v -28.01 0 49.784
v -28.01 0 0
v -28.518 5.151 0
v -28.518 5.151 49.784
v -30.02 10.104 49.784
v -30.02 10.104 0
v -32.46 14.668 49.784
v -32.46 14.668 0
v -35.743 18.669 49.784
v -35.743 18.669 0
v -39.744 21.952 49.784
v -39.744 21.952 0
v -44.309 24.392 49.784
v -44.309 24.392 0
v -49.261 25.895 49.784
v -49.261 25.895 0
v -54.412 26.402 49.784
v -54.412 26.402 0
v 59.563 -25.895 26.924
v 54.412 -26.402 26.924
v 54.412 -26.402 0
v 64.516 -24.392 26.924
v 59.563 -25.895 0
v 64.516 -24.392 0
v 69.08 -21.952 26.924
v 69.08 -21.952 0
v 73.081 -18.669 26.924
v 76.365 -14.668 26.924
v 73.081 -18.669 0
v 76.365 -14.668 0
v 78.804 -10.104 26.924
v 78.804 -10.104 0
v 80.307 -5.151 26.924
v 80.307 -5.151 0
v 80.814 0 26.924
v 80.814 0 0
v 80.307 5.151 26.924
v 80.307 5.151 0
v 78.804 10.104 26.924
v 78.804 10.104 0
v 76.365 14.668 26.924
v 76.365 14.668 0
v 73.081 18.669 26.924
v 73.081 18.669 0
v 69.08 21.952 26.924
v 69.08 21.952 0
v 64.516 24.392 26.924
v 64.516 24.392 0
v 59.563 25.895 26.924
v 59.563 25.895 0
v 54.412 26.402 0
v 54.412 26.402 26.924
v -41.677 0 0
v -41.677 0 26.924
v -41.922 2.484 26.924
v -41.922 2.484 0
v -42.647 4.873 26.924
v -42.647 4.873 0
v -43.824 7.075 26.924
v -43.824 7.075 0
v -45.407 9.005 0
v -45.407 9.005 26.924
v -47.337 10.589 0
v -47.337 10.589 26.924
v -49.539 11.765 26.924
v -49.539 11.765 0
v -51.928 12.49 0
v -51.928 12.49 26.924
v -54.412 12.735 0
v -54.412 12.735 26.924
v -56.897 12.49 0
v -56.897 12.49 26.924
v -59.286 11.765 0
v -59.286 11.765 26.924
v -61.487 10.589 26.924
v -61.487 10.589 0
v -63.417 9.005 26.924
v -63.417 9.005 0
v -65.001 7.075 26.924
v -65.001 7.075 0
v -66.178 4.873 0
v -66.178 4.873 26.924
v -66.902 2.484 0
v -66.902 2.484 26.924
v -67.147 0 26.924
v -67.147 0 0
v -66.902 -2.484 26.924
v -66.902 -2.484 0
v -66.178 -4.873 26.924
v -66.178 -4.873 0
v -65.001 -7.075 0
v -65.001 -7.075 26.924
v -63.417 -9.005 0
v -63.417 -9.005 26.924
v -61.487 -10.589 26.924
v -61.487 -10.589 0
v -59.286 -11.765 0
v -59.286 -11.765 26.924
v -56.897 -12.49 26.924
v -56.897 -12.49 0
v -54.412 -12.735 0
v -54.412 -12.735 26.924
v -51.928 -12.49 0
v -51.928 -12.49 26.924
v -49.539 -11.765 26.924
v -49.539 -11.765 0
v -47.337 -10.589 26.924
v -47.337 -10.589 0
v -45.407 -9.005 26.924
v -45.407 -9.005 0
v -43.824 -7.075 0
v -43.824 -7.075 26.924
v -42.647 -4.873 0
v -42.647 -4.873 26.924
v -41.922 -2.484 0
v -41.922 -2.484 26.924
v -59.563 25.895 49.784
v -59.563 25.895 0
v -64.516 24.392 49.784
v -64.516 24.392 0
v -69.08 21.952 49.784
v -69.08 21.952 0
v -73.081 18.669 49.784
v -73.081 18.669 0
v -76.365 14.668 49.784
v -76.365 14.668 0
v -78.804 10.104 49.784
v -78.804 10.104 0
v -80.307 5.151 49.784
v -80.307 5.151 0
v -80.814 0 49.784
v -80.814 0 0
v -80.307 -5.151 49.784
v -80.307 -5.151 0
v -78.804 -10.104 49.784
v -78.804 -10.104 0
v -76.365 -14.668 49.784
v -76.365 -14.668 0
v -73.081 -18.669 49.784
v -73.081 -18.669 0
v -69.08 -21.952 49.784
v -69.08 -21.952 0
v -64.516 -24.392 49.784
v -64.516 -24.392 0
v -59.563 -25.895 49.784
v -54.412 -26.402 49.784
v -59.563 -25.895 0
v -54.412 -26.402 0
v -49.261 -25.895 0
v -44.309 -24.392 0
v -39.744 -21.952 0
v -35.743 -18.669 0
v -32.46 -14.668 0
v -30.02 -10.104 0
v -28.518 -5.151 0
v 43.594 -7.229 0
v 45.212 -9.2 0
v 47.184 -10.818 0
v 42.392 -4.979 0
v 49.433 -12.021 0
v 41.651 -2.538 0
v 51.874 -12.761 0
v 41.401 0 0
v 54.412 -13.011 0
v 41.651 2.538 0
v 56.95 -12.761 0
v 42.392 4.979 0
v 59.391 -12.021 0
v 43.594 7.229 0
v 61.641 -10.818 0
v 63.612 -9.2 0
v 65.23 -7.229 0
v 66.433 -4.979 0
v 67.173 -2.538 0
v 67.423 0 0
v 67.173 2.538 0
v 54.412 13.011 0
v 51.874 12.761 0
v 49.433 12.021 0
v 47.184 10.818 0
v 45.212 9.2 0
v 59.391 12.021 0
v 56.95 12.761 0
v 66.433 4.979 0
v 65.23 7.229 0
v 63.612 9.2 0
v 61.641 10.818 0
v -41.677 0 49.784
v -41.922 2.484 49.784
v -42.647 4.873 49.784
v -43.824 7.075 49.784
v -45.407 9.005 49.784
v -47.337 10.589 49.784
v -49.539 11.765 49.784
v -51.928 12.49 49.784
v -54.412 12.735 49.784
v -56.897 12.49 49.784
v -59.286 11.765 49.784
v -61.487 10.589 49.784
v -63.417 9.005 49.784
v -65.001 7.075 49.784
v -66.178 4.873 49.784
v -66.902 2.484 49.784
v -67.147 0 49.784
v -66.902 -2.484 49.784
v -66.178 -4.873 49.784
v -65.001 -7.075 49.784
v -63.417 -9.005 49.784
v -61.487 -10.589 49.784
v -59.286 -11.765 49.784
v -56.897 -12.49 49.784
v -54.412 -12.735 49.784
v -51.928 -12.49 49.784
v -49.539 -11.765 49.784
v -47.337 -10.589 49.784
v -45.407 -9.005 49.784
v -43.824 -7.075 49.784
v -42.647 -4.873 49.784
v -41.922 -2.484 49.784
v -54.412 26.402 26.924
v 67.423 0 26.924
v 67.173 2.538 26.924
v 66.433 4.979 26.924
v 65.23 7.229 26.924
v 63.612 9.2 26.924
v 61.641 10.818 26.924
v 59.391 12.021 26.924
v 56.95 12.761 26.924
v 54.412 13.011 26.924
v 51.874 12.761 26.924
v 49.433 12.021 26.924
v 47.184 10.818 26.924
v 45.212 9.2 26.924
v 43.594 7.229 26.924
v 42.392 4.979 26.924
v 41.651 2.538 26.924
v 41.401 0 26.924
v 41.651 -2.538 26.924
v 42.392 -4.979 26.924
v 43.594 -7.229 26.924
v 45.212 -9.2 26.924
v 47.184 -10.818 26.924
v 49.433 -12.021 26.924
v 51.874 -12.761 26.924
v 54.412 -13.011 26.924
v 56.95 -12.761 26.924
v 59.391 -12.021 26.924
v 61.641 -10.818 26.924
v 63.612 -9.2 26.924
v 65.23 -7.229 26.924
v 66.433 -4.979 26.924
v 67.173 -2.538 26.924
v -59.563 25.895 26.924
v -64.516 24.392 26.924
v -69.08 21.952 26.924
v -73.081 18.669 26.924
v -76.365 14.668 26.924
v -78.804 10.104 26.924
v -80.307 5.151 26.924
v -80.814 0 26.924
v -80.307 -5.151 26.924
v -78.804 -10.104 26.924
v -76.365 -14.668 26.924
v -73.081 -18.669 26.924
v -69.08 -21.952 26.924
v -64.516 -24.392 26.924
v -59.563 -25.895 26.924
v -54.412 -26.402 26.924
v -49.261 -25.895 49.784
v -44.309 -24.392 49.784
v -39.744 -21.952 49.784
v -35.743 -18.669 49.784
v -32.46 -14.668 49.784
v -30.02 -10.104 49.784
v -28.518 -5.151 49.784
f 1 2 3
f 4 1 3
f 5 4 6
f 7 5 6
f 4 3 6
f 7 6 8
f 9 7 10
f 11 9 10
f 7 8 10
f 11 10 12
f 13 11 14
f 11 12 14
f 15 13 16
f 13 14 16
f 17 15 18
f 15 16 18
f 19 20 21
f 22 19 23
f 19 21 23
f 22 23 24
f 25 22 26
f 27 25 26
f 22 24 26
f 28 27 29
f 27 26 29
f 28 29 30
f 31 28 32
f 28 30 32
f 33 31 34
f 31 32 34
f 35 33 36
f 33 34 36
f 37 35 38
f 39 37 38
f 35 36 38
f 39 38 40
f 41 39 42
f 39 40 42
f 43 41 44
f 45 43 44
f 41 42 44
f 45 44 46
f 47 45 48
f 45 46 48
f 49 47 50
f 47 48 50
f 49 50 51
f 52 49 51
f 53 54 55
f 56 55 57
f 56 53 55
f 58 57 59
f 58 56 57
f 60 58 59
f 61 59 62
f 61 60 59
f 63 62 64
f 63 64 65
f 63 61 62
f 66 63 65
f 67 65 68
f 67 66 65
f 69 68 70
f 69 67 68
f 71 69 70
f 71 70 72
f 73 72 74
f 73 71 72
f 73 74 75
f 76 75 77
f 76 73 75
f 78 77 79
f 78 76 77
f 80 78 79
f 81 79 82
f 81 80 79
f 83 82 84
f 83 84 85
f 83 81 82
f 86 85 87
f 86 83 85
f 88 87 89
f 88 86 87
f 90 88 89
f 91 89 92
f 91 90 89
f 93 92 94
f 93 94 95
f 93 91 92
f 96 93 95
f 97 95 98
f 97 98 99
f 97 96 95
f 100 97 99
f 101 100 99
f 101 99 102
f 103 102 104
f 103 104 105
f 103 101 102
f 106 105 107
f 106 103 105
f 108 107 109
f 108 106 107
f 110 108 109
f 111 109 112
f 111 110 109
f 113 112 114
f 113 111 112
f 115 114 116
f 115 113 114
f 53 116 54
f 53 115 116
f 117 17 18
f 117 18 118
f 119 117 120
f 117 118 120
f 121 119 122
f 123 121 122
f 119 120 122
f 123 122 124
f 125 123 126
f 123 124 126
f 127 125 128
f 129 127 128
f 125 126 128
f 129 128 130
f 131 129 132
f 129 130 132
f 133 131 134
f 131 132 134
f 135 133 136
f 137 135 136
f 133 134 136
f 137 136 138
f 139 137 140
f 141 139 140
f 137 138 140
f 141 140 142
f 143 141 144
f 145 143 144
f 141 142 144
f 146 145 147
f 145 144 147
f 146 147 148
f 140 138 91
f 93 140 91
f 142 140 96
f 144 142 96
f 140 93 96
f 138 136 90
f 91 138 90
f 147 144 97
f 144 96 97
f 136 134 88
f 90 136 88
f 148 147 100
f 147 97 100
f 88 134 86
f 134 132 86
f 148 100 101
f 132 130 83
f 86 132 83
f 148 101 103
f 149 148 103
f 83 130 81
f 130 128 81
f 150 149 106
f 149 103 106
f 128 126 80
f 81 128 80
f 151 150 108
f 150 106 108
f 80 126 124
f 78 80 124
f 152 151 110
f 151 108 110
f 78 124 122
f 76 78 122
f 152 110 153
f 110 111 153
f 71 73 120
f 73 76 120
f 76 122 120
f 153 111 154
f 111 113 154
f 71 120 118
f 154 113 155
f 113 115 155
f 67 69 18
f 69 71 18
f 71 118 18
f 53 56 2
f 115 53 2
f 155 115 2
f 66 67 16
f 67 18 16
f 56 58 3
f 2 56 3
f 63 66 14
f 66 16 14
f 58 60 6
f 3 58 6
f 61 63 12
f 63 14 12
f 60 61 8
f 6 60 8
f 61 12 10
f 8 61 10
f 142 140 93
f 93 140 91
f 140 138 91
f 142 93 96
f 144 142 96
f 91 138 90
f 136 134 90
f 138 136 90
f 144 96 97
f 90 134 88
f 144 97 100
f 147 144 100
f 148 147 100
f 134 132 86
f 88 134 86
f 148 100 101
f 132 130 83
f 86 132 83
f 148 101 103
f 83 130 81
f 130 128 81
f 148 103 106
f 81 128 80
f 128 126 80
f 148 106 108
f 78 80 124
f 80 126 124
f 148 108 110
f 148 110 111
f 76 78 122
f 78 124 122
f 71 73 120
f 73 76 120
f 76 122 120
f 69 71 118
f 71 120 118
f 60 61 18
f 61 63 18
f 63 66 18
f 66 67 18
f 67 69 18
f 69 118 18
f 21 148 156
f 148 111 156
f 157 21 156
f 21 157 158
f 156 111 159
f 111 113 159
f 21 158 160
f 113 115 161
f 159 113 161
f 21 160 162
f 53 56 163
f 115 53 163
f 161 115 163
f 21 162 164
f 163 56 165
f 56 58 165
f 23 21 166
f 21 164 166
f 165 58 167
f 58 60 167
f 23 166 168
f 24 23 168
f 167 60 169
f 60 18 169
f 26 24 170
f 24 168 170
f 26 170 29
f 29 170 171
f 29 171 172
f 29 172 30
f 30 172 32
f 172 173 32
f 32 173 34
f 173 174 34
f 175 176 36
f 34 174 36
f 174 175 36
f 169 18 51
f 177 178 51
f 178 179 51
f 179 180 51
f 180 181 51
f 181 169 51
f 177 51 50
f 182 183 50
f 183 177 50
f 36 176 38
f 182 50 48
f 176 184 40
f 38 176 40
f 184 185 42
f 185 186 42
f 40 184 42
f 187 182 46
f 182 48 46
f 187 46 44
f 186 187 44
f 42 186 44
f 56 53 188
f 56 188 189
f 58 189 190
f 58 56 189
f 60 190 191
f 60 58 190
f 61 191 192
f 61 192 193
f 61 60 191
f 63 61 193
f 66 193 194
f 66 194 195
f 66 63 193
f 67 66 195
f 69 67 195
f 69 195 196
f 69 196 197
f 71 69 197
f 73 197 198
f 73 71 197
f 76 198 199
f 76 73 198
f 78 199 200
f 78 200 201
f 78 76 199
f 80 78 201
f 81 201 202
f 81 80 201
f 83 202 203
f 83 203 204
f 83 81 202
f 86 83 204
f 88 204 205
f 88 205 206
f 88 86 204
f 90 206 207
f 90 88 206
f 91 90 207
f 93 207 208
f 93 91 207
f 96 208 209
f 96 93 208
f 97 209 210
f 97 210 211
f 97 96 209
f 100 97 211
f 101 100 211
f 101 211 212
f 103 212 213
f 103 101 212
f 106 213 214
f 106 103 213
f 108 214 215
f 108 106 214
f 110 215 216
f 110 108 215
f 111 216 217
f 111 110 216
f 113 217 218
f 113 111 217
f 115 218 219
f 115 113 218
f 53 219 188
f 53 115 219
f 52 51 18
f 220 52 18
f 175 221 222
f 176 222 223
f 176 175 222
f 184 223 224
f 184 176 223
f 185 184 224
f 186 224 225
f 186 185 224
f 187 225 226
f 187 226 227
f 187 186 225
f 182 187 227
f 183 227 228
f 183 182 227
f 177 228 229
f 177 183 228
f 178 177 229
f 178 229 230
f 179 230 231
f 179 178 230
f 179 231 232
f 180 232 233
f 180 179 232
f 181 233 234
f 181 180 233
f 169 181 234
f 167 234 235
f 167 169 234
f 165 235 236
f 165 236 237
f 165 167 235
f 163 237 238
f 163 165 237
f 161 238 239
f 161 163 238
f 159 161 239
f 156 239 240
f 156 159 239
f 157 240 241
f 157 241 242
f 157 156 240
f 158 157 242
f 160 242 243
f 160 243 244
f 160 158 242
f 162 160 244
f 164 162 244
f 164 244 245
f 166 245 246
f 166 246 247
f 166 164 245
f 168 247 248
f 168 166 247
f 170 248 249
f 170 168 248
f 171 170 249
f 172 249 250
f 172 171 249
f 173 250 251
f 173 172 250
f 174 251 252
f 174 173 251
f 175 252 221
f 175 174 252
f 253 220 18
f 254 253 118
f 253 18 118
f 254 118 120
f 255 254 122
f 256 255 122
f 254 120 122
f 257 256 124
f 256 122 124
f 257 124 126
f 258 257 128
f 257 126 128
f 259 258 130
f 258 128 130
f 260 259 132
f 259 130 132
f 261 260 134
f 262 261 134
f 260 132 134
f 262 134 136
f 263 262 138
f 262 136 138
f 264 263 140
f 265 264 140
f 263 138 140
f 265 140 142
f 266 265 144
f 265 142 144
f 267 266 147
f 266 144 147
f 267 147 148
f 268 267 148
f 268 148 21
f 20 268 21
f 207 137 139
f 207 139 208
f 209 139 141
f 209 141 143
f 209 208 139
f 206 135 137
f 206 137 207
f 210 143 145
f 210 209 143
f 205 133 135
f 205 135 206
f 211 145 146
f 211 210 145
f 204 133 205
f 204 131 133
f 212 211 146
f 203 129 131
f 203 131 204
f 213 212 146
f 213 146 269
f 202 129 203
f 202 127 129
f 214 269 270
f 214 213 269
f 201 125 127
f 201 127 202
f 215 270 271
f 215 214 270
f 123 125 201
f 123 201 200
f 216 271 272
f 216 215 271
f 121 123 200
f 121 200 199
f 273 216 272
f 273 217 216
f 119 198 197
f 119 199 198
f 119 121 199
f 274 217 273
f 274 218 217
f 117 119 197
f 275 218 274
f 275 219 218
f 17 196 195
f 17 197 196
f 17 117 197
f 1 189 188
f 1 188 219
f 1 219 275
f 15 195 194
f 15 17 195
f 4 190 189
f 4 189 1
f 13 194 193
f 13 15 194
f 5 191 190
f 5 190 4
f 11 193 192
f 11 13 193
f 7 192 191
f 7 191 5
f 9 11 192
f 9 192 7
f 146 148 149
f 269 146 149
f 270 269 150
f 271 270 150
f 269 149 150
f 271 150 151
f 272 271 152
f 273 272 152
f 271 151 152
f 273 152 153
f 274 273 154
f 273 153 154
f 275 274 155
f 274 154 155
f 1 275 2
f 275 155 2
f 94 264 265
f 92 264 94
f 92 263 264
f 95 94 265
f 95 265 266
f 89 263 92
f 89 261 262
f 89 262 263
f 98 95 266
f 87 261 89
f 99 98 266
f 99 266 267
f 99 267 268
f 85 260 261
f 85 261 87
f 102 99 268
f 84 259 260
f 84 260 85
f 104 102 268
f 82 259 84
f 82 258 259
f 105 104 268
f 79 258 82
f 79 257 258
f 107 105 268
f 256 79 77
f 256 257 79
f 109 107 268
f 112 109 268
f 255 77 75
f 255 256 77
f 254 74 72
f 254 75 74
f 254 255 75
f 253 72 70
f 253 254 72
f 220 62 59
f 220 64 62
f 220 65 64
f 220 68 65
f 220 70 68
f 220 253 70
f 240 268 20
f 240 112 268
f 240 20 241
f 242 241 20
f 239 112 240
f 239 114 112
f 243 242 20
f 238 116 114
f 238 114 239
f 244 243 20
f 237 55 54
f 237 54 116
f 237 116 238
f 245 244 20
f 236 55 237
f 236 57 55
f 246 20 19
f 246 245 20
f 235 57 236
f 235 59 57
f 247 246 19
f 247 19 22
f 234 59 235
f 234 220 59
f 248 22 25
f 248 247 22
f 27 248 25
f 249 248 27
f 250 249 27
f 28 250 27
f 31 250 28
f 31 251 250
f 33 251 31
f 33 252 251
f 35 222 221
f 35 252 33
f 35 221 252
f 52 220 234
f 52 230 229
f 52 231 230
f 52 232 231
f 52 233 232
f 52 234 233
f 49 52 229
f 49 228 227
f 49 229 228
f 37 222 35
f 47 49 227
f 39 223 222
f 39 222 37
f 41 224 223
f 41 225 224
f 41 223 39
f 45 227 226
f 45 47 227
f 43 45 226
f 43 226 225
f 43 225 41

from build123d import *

# Parameters (mm, degrees)
F0_R     = 12.734731
F1_DEPTH = 49.784
F0_R_2   = 13.010998
F2_DEPTH = 26.924


with BuildPart() as f1:
    # F0 (on Top) → F1 (new body)
    with BuildSketch(Plane.XY):
        with BuildLine():
            ThreePointArc((-54.41216, 26.401961), (-80.814121, 0), (-54.41216, -26.401961))
            ThreePointArc((-54.41216, -26.401961), (-35.743154, -18.669006), (-28.010199, 0))
            ThreePointArc((-28.010199, 0), (-35.743154, 18.669006), (-54.41216, 26.401961))
        make_face()
        with Locations((-54.41216, 0)):
            Circle(F0_R, mode=Mode.SUBTRACT)
    extrude(amount=F1_DEPTH)


with BuildPart() as f2:
    # F0 (on Top) → F2 (new body)
    with BuildSketch(Plane.XY):
        with BuildLine():
            Line((-54.41216, -26.401961), (54.41216, -26.401961))
            ThreePointArc((54.41216, -26.401961), (80.814121, 0), (54.41216, 26.401961))
            Line((54.41216, 26.401961), (-54.41216, 26.401961))
            ThreePointArc((-54.41216, 26.401961), (-35.743154, 18.669006), (-28.010199, 0))
            ThreePointArc((-28.010199, 0), (-35.743154, -18.669006), (-54.41216, -26.401961))
        make_face()
        with Locations((54.41216, 0)):
            Circle(F0_R_2, mode=Mode.SUBTRACT)
        with BuildLine():
            ThreePointArc((-54.41216, 26.401961), (-80.814121, 0), (-54.41216, -26.401961))
            ThreePointArc((-54.41216, -26.401961), (-35.743154, -18.669006), (-28.010199, 0))
            ThreePointArc((-28.010199, 0), (-35.743154, 18.669006), (-54.41216, 26.401961))
        make_face()
        with Locations((-54.41216, 0)):
            Circle(F0_R, mode=Mode.SUBTRACT)
    extrude(amount=F2_DEPTH)


solid = Compound([f1.part, f2.part])
